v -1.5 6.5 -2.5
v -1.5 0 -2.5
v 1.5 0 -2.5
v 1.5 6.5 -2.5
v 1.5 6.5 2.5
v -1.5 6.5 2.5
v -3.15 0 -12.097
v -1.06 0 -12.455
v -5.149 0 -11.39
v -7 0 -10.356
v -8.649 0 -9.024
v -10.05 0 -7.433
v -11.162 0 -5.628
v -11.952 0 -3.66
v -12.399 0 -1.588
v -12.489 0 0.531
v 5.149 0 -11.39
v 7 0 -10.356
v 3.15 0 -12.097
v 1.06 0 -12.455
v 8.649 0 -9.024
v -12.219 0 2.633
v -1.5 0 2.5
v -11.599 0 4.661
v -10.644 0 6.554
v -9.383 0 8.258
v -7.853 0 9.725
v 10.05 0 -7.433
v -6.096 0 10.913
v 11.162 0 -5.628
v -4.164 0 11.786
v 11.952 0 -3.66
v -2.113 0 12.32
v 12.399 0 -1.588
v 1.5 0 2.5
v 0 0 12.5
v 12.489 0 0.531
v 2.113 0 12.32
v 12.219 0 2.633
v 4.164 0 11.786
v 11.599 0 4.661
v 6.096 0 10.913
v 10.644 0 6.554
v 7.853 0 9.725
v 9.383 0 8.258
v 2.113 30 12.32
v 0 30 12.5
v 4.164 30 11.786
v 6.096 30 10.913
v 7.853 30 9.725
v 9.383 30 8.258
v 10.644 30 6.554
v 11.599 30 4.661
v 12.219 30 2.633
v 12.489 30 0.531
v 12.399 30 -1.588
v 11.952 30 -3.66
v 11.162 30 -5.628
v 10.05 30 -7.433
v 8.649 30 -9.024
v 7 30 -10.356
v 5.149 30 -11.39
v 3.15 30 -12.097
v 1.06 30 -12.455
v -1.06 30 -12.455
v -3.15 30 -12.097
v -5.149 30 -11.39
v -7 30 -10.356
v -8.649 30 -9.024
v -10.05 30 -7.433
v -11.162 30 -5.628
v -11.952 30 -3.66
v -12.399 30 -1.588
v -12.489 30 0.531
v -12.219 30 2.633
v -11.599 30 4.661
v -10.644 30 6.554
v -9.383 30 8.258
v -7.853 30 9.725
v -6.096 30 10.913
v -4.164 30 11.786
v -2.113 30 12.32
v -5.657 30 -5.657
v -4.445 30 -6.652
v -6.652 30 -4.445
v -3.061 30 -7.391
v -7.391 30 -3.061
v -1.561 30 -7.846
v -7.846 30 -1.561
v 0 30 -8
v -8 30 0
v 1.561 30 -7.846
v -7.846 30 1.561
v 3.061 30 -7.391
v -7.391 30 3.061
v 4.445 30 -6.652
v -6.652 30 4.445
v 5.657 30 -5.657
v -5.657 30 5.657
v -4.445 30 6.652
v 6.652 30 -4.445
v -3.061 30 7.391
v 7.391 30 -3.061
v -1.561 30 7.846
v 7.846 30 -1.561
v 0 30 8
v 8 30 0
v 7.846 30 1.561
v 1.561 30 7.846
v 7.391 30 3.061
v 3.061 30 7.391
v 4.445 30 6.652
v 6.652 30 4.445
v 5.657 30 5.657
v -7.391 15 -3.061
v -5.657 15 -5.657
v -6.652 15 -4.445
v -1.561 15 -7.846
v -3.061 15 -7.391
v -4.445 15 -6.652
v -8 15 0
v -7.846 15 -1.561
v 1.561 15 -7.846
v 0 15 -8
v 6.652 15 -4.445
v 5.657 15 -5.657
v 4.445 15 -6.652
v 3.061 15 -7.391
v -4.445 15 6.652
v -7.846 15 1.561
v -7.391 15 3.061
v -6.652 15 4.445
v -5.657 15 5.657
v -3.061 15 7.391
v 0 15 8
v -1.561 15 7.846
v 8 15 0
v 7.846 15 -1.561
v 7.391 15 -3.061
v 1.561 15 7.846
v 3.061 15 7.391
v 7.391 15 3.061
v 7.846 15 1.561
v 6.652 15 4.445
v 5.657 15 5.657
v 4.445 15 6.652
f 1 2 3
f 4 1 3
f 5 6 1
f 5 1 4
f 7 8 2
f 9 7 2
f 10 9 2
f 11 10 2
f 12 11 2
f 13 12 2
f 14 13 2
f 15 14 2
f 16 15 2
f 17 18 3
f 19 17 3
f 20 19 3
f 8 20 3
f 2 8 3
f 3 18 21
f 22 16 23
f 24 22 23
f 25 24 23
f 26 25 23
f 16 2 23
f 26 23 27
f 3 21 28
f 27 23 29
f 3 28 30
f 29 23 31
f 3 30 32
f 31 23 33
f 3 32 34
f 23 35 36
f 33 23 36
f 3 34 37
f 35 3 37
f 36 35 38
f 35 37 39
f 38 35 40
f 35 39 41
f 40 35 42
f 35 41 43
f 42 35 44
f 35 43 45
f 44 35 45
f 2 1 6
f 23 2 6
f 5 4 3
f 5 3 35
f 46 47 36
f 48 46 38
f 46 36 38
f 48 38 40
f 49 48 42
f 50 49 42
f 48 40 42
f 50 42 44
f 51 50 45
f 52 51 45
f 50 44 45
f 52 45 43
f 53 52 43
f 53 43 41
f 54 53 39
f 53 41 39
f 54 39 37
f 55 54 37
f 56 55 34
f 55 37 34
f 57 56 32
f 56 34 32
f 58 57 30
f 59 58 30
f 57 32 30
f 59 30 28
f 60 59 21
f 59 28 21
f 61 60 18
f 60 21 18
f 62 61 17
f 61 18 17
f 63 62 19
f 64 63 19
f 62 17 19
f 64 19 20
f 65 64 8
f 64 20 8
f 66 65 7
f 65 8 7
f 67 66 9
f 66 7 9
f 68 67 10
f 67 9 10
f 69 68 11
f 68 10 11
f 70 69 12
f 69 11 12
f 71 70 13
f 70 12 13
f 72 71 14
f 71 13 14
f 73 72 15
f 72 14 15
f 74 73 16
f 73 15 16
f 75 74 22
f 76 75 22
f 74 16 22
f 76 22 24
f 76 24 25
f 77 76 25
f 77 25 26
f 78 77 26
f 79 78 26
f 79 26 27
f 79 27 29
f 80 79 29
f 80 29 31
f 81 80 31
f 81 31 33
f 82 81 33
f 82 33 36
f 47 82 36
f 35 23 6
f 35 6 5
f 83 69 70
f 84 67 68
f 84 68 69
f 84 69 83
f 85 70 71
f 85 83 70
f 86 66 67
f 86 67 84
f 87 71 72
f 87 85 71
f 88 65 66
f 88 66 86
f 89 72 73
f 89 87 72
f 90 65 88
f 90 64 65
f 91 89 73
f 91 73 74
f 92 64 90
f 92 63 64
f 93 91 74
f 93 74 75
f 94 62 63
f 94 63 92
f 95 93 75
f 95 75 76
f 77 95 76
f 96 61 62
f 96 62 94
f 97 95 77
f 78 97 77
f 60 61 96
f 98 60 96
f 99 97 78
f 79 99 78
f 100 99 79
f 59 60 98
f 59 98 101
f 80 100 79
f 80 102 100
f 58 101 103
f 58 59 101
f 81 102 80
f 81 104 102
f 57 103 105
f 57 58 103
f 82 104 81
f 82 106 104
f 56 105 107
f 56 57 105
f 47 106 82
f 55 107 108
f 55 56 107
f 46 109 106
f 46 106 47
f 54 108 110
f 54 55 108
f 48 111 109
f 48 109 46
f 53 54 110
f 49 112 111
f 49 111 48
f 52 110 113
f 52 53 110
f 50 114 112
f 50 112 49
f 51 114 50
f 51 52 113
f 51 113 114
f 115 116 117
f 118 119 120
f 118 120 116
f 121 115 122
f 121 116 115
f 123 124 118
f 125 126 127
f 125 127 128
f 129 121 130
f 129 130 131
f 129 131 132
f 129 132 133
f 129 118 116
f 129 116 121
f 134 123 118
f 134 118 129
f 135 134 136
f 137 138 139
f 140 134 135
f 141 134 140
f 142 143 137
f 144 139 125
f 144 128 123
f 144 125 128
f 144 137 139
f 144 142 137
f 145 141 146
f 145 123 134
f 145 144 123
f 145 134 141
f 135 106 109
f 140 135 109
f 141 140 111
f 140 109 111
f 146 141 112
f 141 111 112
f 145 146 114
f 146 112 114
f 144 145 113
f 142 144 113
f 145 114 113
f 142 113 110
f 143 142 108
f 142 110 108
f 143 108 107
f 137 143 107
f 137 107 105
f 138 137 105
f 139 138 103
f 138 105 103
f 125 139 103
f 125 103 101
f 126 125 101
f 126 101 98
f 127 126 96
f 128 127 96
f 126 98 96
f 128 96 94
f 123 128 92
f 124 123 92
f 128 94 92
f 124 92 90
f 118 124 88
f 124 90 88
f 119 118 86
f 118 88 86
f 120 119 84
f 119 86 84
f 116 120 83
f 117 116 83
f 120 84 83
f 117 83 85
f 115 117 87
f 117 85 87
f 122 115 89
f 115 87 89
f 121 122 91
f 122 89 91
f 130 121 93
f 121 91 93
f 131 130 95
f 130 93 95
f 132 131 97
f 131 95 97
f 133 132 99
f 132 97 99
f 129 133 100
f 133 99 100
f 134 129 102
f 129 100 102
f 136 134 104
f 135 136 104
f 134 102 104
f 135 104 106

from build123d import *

# Parameters (mm, degrees)
ESBO_O1_R                = 12.5
RESSALTO_EXTRUS_O1_DEPTH = 30
ESBO_O2_R                = 8
CORTE_EXTRUS_O1_DEPTH    = 15
ESBO_O3_W                = 3
ESBO_O3_H                = 5
CORTE_EXTRUS_O2_DEPTH    = 6.5


with BuildPart() as part:
    # Esboço1 → Ressalto-extrusão1 (new body)
    with BuildSketch(Plane(origin=(0, 0, 0), x_dir=(1, 0, 0), z_dir=(0, 1, 0))):
        with Locations(Location((0, 0, 0), (0, 0, 270))):
            Circle(ESBO_O1_R)
    extrude(amount=RESSALTO_EXTRUS_O1_DEPTH)

    # Esboço2 → Corte-extrusão1 (cut)
    with BuildSketch(Plane(origin=(0, 30, 0), x_dir=(1, 0, 0), z_dir=(0, 1, 0))):
        with Locations(Location((0, 0, 0), (0, 0, 270))):
            Circle(ESBO_O2_R)
    extrude(amount=-CORTE_EXTRUS_O1_DEPTH, mode=Mode.SUBTRACT)

    # Esboço3 → Corte-extrusão2 (cut)
    with BuildSketch(Plane.XZ):
        Rectangle(ESBO_O3_W, ESBO_O3_H)
    extrude(amount=-CORTE_EXTRUS_O2_DEPTH, mode=Mode.SUBTRACT)


solid = part.part
